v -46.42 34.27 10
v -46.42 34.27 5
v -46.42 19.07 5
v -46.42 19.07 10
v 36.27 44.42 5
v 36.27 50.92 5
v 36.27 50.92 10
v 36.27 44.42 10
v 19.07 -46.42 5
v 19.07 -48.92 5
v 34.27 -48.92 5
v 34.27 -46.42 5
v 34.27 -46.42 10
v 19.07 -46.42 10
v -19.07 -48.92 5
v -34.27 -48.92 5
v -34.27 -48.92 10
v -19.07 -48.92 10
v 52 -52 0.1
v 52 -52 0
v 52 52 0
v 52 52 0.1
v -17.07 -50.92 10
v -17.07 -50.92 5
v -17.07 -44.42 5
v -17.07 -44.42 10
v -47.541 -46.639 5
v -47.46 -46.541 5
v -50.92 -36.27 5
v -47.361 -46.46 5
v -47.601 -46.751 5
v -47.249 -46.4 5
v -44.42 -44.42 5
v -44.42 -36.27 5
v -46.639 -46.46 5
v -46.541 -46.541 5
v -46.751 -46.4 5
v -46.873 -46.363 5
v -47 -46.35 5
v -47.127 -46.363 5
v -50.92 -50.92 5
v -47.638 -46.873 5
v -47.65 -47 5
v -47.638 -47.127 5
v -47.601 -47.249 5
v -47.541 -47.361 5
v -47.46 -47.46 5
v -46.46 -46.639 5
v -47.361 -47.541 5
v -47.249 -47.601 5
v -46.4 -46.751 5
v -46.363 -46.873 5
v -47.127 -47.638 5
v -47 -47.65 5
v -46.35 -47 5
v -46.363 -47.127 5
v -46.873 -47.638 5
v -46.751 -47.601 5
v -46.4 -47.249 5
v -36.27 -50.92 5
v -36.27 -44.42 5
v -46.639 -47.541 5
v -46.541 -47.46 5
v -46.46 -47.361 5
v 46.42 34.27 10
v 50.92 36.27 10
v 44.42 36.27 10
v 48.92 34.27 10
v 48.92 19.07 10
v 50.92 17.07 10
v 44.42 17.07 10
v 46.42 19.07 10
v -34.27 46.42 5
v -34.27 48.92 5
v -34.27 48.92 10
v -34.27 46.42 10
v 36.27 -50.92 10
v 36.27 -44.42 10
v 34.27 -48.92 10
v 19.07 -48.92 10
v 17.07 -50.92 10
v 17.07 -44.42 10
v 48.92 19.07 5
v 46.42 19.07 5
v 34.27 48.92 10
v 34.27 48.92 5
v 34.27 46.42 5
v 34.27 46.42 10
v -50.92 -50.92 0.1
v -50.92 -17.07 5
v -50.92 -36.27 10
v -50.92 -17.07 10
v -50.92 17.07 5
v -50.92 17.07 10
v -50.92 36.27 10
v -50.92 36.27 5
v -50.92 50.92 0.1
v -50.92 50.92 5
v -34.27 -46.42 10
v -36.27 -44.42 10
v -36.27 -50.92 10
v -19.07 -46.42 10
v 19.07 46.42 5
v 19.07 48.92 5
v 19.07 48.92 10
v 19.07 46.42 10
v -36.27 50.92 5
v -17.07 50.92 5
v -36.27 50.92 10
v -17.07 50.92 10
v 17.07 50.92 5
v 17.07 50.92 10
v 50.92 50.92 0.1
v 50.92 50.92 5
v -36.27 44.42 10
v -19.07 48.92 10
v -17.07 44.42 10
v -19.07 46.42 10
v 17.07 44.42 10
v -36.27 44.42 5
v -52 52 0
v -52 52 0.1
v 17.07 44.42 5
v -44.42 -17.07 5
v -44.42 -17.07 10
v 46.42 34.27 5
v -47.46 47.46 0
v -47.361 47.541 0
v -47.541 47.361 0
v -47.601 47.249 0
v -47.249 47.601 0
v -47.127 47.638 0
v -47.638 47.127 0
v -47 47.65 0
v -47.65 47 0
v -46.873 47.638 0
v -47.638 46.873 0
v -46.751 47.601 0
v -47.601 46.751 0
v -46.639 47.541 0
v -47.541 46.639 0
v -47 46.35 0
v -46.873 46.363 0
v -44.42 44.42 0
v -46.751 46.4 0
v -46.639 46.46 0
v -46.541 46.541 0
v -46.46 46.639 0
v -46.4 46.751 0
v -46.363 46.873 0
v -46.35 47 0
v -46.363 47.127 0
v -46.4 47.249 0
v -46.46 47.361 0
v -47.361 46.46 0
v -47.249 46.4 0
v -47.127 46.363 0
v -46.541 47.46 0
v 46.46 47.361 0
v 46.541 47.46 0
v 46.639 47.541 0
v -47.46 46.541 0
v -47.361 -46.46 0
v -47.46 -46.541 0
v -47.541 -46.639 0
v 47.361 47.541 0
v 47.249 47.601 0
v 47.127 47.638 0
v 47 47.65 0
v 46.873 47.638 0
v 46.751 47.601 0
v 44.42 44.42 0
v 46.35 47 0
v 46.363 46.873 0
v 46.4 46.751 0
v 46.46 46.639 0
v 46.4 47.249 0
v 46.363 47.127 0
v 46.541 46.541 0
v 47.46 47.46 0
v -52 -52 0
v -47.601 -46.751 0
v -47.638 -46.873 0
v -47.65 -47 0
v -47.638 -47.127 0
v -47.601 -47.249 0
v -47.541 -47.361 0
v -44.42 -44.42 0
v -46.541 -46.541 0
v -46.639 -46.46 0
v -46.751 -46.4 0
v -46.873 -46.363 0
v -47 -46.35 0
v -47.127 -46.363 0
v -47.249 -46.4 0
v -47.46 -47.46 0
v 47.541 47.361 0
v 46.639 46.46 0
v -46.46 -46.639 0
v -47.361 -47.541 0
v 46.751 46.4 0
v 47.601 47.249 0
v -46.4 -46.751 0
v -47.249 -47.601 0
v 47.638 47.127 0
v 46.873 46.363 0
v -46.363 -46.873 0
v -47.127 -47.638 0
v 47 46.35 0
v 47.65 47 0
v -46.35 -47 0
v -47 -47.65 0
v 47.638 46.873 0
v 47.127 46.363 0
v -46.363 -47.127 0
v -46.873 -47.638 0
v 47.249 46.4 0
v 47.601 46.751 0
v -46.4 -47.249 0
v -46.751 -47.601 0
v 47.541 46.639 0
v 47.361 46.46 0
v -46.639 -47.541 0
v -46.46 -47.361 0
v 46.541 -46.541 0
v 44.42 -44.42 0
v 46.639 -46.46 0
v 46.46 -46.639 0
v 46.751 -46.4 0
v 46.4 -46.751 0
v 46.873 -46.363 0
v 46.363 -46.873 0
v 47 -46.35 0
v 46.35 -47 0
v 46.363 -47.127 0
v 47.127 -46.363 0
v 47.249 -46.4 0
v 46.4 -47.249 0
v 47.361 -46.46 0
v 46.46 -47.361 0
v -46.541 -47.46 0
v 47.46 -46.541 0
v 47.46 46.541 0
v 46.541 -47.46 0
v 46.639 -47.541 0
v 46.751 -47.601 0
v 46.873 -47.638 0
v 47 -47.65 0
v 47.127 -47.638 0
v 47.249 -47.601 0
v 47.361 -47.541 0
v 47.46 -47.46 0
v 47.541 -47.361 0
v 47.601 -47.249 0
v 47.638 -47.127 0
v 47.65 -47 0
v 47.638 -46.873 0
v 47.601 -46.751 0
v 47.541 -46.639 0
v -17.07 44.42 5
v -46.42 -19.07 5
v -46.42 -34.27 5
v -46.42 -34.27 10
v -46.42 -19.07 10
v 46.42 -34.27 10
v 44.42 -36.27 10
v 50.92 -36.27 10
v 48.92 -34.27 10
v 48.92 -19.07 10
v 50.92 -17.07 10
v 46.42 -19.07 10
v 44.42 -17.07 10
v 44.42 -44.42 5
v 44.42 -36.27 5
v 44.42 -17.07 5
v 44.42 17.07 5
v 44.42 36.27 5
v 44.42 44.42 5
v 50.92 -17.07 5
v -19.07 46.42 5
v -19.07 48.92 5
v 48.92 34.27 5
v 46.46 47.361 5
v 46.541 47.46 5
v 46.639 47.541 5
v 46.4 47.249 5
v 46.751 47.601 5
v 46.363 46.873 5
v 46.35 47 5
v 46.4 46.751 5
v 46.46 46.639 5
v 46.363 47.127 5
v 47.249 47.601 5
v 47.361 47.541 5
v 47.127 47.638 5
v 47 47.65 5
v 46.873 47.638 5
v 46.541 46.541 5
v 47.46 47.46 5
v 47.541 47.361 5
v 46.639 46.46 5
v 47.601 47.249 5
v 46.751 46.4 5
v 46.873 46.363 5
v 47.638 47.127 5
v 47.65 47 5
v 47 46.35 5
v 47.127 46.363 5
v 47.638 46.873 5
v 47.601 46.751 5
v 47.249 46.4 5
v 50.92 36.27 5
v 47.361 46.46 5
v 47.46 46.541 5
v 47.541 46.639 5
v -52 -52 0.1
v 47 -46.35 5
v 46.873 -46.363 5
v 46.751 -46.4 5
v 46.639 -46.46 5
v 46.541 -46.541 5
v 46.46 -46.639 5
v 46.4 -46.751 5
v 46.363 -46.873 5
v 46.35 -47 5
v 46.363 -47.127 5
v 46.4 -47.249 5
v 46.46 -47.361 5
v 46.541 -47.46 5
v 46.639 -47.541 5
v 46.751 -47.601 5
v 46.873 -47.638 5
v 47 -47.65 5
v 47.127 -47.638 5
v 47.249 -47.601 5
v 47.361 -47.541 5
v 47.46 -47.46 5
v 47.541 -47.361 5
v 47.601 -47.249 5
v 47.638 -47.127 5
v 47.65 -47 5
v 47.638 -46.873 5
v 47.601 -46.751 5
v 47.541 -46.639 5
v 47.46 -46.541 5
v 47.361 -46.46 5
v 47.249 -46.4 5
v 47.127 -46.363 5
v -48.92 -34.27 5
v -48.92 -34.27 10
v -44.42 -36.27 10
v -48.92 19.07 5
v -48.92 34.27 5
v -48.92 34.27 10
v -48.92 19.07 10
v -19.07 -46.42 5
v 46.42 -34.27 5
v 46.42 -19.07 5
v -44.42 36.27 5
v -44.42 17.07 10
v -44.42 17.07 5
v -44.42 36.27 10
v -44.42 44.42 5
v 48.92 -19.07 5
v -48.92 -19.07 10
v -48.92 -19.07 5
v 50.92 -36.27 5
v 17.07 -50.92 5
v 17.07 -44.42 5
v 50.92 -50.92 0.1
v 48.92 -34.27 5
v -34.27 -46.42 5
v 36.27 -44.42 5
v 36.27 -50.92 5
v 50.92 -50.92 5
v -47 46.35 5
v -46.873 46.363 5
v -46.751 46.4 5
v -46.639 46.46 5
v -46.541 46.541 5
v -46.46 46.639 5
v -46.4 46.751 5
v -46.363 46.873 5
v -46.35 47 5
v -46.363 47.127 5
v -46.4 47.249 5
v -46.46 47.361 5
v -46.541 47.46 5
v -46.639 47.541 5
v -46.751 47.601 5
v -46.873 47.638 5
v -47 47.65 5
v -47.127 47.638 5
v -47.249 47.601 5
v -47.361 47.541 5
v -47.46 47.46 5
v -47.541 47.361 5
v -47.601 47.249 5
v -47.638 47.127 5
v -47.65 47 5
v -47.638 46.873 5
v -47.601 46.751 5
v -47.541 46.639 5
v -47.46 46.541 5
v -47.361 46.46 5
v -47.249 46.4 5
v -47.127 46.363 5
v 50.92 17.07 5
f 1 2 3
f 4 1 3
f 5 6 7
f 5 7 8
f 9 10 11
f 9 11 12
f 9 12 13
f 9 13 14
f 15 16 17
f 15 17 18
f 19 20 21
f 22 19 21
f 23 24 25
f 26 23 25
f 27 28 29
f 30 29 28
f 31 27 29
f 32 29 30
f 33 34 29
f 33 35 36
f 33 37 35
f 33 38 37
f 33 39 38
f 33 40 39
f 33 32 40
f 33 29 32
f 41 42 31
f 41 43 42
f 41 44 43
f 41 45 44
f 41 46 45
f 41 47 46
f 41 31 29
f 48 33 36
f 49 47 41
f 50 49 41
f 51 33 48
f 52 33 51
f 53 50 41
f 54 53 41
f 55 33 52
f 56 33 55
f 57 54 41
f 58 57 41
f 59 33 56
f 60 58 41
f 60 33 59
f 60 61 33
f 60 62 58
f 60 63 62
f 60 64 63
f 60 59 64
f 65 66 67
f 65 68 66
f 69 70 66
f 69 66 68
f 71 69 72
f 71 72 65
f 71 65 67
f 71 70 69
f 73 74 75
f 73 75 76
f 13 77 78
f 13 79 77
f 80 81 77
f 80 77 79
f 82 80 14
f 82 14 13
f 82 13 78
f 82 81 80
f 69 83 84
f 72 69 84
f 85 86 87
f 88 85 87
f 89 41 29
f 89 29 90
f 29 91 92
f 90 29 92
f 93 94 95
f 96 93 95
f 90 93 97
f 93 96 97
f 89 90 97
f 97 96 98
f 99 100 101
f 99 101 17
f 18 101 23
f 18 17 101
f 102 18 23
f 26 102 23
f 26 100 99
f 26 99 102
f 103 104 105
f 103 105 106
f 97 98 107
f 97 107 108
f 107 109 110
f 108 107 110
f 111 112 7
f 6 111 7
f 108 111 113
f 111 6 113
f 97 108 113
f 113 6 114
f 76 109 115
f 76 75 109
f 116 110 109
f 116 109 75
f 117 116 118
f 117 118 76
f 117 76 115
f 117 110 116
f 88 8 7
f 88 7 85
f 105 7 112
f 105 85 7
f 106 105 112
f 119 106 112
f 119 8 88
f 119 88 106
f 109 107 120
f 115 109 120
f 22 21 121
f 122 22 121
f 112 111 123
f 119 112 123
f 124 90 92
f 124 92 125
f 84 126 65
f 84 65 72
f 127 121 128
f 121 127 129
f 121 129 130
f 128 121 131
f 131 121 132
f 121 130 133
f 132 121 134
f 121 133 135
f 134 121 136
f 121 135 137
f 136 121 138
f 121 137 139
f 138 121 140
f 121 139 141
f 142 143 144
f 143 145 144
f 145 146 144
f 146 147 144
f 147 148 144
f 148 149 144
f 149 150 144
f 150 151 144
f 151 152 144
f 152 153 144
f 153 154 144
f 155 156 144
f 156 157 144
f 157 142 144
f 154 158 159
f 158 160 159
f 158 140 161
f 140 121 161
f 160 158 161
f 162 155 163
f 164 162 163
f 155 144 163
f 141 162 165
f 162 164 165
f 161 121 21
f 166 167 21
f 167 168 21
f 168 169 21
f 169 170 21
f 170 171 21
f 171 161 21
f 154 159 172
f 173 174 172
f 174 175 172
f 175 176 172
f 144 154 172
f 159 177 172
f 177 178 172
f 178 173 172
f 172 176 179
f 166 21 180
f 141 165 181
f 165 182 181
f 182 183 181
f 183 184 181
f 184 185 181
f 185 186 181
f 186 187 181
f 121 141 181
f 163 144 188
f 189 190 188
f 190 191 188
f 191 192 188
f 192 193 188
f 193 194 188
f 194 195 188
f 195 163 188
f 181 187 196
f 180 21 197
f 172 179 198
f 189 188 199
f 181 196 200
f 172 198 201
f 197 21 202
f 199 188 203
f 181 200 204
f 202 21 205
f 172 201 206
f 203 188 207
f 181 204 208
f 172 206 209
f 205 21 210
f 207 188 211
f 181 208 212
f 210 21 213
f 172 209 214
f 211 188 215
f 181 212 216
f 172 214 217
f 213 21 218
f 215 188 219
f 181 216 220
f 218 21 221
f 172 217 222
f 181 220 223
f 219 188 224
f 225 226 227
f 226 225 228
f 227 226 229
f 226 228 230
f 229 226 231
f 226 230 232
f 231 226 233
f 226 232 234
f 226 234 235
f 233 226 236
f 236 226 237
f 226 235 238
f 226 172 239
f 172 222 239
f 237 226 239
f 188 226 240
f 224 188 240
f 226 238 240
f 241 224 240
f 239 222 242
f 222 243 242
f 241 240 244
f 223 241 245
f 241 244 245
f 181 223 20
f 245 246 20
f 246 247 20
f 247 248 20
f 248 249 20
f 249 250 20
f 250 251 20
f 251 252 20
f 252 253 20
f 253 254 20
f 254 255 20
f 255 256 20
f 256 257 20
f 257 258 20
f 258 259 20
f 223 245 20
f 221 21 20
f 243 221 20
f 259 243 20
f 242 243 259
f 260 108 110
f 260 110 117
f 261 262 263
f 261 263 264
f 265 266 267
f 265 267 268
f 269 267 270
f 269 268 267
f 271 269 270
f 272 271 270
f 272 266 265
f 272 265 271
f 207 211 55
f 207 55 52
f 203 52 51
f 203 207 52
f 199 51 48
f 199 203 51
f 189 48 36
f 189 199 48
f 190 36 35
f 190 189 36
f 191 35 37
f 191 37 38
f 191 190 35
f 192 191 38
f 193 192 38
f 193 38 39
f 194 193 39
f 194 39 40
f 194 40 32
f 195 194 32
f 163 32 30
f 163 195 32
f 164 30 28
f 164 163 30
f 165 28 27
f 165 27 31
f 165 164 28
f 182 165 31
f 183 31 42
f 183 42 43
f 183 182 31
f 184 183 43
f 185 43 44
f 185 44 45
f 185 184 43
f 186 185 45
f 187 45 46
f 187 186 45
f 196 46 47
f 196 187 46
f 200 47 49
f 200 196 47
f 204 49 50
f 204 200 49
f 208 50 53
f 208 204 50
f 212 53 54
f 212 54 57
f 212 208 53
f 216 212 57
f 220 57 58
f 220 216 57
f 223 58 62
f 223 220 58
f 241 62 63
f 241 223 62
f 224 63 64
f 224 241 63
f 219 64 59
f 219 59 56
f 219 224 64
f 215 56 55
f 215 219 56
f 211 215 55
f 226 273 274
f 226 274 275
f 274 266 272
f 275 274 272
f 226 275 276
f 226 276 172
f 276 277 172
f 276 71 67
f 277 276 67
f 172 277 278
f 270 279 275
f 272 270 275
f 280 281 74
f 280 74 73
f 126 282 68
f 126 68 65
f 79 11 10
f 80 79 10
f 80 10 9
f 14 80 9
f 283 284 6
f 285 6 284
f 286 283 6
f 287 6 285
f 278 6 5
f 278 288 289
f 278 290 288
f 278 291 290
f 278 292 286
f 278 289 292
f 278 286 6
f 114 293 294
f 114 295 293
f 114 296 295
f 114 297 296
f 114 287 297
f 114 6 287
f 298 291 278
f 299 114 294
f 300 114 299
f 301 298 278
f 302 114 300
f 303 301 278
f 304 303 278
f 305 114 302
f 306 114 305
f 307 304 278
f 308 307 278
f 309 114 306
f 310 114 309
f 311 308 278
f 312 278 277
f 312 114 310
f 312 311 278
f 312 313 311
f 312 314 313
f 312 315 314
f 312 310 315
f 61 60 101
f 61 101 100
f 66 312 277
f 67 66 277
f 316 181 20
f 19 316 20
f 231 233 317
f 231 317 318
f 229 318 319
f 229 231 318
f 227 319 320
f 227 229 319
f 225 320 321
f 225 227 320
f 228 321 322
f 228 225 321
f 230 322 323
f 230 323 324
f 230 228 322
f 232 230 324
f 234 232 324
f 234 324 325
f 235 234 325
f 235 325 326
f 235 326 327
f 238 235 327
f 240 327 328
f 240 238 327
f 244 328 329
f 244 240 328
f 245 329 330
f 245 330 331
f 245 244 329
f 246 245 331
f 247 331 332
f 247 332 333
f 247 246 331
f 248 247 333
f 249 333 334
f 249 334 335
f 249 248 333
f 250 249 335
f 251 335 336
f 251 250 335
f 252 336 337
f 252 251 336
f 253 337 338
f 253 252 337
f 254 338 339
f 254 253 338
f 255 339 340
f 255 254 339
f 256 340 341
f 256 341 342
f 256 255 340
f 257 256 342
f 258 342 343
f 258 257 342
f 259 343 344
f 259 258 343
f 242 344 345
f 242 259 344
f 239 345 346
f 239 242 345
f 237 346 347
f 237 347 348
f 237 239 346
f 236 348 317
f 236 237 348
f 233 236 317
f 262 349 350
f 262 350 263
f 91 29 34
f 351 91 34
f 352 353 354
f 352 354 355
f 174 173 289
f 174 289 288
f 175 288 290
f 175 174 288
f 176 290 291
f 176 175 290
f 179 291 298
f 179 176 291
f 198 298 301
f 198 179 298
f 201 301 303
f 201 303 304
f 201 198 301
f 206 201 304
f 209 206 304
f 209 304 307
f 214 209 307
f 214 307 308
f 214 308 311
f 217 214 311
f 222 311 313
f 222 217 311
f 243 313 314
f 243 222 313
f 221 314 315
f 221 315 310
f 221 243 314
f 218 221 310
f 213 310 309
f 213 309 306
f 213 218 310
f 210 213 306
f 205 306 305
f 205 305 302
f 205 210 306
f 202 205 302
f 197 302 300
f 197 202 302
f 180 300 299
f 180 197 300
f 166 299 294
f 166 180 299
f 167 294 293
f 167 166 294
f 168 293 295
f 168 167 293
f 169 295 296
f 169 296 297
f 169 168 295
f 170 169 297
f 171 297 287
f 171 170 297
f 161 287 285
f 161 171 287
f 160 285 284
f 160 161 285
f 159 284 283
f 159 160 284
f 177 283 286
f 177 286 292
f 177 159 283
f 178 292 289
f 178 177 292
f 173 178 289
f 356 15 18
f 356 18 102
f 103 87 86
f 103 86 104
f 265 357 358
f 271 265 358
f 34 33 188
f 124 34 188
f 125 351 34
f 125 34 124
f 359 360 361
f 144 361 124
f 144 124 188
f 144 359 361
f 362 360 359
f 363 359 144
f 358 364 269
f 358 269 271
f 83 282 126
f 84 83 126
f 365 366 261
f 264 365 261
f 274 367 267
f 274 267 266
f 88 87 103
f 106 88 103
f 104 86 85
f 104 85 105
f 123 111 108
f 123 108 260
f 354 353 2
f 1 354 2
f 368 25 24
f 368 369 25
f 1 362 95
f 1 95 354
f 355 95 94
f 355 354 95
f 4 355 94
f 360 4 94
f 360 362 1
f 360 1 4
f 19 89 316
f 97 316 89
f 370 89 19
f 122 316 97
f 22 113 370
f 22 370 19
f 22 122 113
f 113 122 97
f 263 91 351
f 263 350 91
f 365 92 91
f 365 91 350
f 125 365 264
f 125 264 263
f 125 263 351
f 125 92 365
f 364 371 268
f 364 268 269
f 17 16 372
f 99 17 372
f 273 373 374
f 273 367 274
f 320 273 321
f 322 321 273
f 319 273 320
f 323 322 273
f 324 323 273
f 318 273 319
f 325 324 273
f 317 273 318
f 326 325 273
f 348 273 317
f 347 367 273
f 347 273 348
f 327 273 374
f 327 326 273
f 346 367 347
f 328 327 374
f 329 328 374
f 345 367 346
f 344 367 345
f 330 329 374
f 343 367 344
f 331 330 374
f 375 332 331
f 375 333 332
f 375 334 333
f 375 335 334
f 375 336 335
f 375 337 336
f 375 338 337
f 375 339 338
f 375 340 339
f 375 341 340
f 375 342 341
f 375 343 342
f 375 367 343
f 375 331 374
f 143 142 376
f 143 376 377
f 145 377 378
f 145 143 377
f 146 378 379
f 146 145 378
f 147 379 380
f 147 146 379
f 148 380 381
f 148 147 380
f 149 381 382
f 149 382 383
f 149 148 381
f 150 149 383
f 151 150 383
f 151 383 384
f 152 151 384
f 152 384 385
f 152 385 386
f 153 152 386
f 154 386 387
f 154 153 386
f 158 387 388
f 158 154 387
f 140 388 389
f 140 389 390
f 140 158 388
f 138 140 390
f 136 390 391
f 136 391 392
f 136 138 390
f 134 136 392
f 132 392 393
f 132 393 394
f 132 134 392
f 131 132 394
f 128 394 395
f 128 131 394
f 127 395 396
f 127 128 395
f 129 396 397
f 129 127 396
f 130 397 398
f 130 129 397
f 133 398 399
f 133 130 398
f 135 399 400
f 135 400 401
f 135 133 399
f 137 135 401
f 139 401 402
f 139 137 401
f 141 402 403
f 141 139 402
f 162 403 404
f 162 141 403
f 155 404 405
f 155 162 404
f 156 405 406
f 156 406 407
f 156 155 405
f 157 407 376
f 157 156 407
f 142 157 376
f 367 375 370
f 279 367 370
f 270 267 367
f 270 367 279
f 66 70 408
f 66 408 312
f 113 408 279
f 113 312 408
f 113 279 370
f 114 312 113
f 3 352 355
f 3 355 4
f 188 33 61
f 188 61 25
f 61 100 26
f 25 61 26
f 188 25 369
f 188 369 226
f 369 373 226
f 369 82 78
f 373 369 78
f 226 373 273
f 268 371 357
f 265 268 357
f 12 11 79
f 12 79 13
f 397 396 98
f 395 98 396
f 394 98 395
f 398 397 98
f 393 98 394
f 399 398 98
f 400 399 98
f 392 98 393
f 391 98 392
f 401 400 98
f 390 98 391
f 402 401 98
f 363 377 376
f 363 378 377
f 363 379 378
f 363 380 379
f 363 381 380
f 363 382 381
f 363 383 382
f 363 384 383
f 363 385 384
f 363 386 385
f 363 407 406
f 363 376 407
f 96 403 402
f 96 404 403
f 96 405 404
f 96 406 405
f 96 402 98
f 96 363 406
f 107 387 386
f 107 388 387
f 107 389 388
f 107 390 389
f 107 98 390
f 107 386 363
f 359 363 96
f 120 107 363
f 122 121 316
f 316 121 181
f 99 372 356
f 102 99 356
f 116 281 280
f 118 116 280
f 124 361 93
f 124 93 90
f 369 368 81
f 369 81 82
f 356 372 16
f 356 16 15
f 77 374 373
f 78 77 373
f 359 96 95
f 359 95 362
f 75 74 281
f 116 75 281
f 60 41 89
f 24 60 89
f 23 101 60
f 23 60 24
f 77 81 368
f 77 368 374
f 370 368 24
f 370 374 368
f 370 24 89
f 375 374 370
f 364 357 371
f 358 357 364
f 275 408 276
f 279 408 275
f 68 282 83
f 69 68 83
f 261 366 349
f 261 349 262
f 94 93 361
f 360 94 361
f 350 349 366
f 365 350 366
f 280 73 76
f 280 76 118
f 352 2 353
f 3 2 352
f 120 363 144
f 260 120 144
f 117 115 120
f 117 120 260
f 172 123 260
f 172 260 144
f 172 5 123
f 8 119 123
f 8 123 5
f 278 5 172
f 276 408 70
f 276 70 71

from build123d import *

# Parameters (mm, degrees)
SKETCH_R           = 0.65
PAD_DEPTH          = 5
SKETCH001_W        = 19.2
SKETCH001_H        = 6.5
SKETCH001_W_2      = 15.2
SKETCH001_H_2      = 2.5
SKETCH001_W_3      = 6.5
SKETCH001_H_3      = 19.2
SKETCH001_W_4      = 2.5
SKETCH001_H_4      = 15.2
PAD001_DEPTH       = 5
POLARPATTERN_COUNT = 4
SKETCH002_W        = 88.84
SKETCH002_H        = 88.84
POCKET_DEPTH       = 5.001
SKETCH003_W        = 135.310039
SKETCH003_H        = 121.25861
SKETCH003_W_2      = 101.84
SKETCH003_H_2      = 101.84
POCKET001_DEPTH    = 4.9


with BuildPart() as part:
    # Sketch → Pad (new body)
    with BuildSketch(Plane.XY):
        Polygon((-52.00016, -52.00016), (0, -52.00016), (0, -42.00016), (-34.929092, -42.00016), (0, -7.071068), (0, 0), (-7.071068, 0), (-42.00016, -34.929092), (-42.00016, 0), (-52.00016, 0), align=None)
        with Locations((-47.00016, -47.00016)):
            Circle(SKETCH_R, mode=Mode.SUBTRACT)
        with Locations((-26.67, -26.67)):
            Circle(SKETCH_R, mode=Mode.SUBTRACT)
    pad = extrude(amount=PAD_DEPTH)

    # Sketch001 (on Face14 of Pad) → Pad001 (join)
    with BuildSketch(Plane.XY.offset(5)):
        with Locations((-26.67, -47.67)):
            Rectangle(SKETCH001_W, SKETCH001_H)
        with Locations((-26.67, -47.67)):
            Rectangle(SKETCH001_W_2, SKETCH001_H_2, mode=Mode.SUBTRACT)
        with Locations((-47.67, -26.67)):
            Rectangle(SKETCH001_W_3, SKETCH001_H_3)
        with Locations((-47.67, -26.67)):
            Rectangle(SKETCH001_W_4, SKETCH001_H_4, mode=Mode.SUBTRACT)
    pad001 = extrude(amount=PAD001_DEPTH)

    # PolarPattern: Pad, Pad001 ×4 about axis
    polarpattern_axis = Axis((0, 0, 0), (0, 0, 1))
    for i in range(1, POLARPATTERN_COUNT):
        add(pad.rotate(polarpattern_axis, i * 360 / POLARPATTERN_COUNT))
        add(pad001.rotate(polarpattern_axis, i * 360 / POLARPATTERN_COUNT))

    # Sketch002 (on Face20 of PolarPattern) → Pocket (cut, through all)
    with BuildSketch(Plane.XY.offset(5)):
        Rectangle(SKETCH002_W, SKETCH002_H)
    extrude(amount=-POCKET_DEPTH, mode=Mode.SUBTRACT)

    # Sketch003 (on Face5 of Pocket) → Pocket001 (cut)
    with BuildSketch(Plane.XY.offset(5)):
        with Locations((8.080424, -2.412195)):
            Rectangle(SKETCH003_W, SKETCH003_H)
        Rectangle(SKETCH003_W_2, SKETCH003_H_2, mode=Mode.SUBTRACT)
    extrude(amount=-POCKET001_DEPTH, mode=Mode.SUBTRACT)


solid = part.part
